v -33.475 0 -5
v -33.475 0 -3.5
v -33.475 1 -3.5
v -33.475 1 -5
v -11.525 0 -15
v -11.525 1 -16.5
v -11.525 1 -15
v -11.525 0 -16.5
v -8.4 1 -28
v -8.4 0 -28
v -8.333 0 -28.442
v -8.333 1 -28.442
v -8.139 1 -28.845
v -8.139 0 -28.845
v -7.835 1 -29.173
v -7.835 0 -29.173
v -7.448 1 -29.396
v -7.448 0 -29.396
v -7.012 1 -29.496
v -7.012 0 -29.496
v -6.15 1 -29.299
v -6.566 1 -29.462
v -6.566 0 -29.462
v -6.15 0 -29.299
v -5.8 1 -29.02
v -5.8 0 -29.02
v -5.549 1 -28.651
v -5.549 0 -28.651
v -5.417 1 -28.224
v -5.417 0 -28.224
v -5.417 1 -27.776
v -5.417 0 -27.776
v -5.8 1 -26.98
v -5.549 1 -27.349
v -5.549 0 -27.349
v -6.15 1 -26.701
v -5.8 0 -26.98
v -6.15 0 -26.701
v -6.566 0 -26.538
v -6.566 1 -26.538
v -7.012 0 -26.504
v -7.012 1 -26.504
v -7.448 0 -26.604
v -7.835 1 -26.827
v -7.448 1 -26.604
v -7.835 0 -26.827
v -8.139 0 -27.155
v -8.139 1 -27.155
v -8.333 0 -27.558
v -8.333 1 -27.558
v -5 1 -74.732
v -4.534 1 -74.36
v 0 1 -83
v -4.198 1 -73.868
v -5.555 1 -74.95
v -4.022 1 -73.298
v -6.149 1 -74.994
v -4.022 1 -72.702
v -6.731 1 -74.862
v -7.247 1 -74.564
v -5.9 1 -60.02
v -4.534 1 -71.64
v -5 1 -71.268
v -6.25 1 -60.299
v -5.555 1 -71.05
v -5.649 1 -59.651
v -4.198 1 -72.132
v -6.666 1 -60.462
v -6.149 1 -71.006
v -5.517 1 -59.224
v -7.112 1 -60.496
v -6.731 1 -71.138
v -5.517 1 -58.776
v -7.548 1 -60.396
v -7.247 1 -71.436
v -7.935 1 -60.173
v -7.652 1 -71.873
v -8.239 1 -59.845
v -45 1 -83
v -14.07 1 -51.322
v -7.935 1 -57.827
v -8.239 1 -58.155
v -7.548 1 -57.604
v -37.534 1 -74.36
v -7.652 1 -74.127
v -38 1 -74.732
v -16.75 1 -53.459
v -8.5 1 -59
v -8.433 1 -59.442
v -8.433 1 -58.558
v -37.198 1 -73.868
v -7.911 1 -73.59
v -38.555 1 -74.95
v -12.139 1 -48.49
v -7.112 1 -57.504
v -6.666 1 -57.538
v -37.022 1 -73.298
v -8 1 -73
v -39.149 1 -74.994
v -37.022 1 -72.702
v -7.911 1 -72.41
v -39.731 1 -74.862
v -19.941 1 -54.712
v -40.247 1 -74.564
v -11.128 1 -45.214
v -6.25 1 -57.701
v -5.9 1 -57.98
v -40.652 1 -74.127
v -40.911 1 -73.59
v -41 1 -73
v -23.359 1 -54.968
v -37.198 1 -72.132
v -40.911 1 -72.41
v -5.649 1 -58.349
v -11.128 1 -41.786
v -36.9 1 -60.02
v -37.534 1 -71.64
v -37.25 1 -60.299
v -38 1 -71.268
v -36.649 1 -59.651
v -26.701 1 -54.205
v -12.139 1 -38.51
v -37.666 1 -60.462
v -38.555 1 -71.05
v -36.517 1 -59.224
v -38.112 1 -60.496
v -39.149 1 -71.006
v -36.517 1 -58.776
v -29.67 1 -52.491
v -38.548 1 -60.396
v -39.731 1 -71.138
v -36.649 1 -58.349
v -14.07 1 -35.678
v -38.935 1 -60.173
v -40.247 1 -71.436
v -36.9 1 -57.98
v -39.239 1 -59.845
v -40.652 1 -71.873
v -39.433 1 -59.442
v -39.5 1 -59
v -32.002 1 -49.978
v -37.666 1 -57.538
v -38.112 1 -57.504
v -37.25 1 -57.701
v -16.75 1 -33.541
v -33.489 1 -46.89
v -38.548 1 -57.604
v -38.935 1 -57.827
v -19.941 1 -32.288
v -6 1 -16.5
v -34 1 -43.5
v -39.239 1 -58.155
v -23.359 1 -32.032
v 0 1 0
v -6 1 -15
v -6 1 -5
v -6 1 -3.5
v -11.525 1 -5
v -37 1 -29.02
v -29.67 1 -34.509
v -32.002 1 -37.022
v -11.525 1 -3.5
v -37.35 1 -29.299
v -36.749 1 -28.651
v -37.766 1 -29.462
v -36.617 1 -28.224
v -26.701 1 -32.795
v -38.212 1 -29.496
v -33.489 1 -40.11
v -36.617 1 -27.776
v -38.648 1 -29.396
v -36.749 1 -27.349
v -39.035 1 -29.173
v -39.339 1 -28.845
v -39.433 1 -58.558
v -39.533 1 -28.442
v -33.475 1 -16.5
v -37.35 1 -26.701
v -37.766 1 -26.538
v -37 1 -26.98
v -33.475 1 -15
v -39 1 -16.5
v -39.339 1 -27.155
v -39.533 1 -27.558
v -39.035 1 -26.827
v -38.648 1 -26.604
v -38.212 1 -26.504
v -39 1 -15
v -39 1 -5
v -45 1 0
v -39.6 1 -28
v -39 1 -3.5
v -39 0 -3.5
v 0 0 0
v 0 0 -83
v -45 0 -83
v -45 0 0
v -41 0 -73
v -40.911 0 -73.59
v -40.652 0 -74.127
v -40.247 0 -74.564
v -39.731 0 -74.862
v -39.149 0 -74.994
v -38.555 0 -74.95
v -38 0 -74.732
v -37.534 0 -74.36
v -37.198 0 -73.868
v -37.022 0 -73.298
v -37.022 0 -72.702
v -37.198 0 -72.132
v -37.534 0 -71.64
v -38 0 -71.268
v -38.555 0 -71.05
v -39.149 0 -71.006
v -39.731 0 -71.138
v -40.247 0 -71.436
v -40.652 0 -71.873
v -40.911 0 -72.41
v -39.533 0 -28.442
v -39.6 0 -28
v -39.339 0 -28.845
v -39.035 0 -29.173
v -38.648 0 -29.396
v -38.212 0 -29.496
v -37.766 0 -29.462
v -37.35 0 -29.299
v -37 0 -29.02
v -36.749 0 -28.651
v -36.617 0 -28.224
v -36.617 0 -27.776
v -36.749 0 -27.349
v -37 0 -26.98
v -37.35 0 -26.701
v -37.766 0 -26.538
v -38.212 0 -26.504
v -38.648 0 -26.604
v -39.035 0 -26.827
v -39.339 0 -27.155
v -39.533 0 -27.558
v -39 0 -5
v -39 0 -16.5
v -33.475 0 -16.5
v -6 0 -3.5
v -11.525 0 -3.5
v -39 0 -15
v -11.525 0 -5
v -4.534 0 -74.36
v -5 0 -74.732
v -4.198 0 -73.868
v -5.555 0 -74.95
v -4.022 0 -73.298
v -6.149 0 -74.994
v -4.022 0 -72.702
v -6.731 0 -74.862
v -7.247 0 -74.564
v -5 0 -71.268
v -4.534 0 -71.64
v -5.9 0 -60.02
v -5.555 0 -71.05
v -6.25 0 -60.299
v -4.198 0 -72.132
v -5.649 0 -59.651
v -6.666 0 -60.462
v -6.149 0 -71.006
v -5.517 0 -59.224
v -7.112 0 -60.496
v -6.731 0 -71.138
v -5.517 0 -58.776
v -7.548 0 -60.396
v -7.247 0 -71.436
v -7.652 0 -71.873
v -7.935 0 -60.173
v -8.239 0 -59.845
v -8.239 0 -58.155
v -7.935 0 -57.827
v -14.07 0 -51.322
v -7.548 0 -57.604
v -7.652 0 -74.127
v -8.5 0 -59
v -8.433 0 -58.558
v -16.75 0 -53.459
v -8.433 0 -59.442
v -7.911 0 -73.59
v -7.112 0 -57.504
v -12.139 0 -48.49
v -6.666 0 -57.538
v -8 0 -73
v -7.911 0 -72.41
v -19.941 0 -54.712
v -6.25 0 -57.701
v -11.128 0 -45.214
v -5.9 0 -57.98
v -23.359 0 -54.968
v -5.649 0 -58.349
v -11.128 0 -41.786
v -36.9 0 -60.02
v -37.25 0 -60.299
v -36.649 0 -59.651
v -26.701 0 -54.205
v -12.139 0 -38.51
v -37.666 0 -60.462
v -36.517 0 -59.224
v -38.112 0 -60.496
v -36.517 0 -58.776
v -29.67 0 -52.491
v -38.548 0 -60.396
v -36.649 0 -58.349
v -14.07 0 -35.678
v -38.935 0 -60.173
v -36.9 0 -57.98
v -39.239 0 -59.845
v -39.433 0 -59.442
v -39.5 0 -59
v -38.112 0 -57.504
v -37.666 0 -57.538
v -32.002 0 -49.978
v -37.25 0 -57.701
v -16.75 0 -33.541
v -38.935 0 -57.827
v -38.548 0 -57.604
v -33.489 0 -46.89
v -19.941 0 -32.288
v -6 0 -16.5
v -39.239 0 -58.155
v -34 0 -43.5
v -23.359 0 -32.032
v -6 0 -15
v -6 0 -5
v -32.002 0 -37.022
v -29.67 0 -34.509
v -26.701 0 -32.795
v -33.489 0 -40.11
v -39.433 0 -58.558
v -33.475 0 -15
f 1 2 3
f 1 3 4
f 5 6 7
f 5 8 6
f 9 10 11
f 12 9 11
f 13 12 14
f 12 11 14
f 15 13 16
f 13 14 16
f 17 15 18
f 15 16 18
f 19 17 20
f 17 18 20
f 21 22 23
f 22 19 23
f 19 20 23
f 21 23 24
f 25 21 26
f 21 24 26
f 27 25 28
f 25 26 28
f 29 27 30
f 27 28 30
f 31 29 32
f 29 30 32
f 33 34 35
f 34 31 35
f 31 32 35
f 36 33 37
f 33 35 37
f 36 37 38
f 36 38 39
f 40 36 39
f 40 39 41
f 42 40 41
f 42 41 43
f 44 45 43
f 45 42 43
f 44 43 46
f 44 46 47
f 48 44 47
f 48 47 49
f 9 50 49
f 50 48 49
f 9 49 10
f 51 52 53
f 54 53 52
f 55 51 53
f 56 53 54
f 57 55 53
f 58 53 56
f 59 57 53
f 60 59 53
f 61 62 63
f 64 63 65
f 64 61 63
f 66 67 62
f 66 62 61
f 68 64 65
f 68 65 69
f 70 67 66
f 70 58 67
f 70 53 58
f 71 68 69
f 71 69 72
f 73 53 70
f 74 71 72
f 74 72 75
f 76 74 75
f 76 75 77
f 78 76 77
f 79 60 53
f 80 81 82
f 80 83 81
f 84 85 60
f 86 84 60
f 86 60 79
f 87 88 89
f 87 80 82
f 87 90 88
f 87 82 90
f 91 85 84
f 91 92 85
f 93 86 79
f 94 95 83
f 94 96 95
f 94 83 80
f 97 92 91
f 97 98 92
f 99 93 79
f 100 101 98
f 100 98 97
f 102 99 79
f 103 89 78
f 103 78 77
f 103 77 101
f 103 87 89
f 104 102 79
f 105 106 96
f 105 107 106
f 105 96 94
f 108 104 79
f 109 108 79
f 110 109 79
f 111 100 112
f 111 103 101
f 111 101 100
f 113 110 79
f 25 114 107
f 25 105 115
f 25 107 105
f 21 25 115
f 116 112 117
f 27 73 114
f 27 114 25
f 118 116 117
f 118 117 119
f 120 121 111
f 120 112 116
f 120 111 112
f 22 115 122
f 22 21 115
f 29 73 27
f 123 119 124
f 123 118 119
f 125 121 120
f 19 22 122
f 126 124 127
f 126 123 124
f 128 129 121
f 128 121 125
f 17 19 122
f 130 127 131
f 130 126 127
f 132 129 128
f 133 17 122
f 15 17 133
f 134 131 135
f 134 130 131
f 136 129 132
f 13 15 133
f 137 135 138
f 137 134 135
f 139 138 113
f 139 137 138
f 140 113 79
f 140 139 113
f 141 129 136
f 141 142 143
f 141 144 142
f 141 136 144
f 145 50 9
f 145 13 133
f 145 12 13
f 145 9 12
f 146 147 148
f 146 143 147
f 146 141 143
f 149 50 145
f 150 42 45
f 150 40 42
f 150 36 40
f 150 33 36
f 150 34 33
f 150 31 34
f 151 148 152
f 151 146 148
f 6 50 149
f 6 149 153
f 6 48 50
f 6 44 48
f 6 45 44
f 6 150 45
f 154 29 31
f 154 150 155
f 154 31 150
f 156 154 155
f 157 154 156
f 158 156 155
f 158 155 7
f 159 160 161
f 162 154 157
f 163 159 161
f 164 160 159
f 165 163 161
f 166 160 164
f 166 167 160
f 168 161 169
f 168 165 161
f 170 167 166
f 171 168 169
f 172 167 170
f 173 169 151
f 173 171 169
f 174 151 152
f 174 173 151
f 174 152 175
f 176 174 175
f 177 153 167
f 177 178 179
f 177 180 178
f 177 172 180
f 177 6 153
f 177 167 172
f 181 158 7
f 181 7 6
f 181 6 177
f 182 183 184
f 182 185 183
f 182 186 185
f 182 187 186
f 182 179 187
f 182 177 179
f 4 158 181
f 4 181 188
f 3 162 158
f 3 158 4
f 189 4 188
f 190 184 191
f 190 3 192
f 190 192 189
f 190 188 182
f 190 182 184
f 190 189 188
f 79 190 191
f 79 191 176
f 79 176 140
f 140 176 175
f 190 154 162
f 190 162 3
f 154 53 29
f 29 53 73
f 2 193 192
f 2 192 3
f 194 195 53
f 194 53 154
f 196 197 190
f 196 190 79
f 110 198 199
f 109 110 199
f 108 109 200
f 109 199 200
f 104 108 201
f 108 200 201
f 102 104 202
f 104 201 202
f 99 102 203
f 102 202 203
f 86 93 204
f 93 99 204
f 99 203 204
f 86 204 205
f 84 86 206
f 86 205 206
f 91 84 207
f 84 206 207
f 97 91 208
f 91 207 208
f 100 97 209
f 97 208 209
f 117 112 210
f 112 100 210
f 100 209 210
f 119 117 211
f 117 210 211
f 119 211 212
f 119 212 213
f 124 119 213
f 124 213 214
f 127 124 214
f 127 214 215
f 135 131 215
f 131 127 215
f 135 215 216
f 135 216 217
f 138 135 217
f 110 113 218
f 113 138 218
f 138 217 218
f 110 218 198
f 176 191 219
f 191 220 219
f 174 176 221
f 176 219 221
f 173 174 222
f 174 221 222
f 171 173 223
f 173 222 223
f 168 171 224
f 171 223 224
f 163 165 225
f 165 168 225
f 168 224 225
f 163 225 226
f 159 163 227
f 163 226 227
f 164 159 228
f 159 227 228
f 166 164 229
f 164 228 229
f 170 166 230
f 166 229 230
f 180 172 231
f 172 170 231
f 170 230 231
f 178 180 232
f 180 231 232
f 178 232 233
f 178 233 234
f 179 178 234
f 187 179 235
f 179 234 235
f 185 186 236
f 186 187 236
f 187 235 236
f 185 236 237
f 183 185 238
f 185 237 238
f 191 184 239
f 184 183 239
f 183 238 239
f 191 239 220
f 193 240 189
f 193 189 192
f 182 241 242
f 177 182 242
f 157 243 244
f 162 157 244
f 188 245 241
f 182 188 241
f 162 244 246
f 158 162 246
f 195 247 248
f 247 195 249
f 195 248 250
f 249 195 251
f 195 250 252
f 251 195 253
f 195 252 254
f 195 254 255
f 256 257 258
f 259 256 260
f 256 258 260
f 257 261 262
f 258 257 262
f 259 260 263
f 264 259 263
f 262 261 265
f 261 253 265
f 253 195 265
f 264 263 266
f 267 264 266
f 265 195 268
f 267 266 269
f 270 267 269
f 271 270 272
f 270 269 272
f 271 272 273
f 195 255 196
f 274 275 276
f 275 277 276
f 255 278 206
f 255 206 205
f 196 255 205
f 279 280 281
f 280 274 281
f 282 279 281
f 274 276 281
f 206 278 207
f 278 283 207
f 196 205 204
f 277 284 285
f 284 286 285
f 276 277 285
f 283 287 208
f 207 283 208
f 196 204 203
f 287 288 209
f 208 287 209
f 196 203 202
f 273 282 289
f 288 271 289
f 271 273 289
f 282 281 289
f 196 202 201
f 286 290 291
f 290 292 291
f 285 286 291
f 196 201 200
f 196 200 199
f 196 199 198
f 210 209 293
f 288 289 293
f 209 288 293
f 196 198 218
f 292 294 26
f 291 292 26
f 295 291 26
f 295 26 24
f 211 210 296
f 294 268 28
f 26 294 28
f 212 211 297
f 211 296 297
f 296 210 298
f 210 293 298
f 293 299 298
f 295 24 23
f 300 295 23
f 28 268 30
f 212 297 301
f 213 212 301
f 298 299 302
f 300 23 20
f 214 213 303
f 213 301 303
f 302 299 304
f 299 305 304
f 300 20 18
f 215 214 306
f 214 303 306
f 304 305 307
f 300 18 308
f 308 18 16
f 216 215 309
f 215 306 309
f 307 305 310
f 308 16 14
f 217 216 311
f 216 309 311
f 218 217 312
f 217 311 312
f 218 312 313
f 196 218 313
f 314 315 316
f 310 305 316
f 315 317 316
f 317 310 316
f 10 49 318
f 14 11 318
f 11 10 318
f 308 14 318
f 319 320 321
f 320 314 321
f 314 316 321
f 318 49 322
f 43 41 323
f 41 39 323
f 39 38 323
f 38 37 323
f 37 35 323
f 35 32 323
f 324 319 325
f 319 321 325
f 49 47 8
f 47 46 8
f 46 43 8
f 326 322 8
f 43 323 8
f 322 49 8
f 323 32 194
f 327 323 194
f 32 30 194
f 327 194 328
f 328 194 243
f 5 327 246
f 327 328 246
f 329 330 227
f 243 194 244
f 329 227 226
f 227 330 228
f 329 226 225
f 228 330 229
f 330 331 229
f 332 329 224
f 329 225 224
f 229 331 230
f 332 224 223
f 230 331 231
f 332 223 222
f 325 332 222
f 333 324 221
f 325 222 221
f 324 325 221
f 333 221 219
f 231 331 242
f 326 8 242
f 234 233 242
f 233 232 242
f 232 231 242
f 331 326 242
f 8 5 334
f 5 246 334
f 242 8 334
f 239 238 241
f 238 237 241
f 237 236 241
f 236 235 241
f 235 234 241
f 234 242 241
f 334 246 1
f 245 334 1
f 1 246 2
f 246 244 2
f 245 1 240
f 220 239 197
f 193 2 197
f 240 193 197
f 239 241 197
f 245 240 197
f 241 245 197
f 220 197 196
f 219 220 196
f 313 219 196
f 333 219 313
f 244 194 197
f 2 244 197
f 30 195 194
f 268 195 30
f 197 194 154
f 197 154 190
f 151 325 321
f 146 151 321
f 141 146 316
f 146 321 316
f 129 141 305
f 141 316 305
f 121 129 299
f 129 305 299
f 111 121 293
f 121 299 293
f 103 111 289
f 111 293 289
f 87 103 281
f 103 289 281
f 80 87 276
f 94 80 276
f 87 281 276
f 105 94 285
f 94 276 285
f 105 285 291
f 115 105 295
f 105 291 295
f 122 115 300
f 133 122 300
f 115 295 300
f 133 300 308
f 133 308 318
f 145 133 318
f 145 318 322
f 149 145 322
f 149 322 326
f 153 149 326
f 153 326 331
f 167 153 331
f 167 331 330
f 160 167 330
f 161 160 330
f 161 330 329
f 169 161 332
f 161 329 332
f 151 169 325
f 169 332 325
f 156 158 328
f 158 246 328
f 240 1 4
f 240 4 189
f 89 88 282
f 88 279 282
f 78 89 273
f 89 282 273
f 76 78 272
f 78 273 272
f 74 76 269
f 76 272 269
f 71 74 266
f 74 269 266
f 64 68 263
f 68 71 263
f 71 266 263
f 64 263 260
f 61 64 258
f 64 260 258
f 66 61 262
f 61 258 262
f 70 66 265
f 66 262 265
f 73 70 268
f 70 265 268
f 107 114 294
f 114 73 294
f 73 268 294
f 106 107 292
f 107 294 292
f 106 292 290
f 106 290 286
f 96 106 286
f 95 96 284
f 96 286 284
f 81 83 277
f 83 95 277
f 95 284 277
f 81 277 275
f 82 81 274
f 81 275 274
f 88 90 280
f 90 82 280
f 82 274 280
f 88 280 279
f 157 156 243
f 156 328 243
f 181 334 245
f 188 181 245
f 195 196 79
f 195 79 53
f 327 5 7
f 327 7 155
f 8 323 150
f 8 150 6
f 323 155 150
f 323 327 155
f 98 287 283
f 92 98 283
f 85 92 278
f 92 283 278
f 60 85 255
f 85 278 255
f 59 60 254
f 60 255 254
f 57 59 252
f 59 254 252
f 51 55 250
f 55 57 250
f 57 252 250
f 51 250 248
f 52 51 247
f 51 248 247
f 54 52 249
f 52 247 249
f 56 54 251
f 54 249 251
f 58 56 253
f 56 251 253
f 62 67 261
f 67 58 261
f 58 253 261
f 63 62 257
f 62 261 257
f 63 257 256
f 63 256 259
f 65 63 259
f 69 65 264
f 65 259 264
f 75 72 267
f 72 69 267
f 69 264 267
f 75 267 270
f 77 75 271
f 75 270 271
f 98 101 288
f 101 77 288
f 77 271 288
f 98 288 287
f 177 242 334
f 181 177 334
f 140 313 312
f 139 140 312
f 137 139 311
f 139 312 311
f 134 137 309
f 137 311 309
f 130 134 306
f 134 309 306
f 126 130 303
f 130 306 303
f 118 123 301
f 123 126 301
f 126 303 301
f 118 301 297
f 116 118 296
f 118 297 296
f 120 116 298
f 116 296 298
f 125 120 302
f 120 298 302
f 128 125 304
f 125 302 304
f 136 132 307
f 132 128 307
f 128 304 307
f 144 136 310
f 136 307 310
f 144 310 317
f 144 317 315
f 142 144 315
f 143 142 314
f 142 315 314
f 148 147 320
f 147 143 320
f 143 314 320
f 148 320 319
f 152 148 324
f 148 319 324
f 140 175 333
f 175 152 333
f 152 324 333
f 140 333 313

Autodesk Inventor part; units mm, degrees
ref_plane "YZ Plane" through (0, 0, 0) normal (1, 0, 0) x (0, 1, 0)
ref_plane "XZ Plane" through (0, 0, 0) normal (0, 1, 0) x (-1, 0, 0)
ref_plane "XY Plane" through (0, 0, 0) normal (0, 0, 1) x (1, 0, 0)
sketch "Sketch1" plane through (0, 0, 0) normal (0, 1, 0) x (-1, 0, 0)
  line L0 (0, 0) -> (45, 0)
  line L1 (45, 0) -> (45, -83)
  line L2 (45, -83) -> (0, -83)
  line L3 (0, -83) -> (0, 0)
  circle A0 centre (39, -73) radius 2
  line L4 (22.5, 0) -> (22.5, -83)
  circle A1 centre (22.5, -43.5) radius 11.5
  circle A2 centre (38.1, -28) radius 1.5
  circle A3 centre (38, -59) radius 1.5
  circle A4 centre (6, -73) radius 2
  circle A5 centre (6.9, -28) radius 1.5
  circle A6 centre (7, -59) radius 1.5
  line L5 (45, -10) -> (0, -10)
  line L6 (6, -3.5) -> (11.525, -3.5)
  line L7 (11.525, -3.5) -> (11.525, -5)
  line L8 (11.525, -5) -> (6, -5)
  line L9 (6, -5) -> (6, -3.5)
  line L10 (6, -16.5) -> (11.525, -16.5)
  line L11 (11.525, -16.5) -> (11.525, -15)
  line L12 (11.525, -15) -> (6, -15)
  line L13 (6, -15) -> (6, -16.5)
  line L14 (39, -3.5) -> (33.475, -3.5)
  line L15 (33.475, -3.5) -> (33.475, -5)
  line L16 (33.475, -5) -> (39, -5)
  line L17 (39, -5) -> (39, -3.5)
  line L18 (39, -16.5) -> (33.475, -16.5)
  line L19 (33.475, -15) -> (39, -15)
  line L20 (39, -15) -> (39, -16.5)
  line L21 (33.475, -16.5) -> (33.475, -15)
  dimension "d0" = 45
  dimension "d1" = 83
  dimension "d2" = 10
  dimension "d3" = 6
  dimension "d9" = 4
  dimension "d13" = 45
  dimension "d14" = 24
  dimension "d15" = 31
  dimension "d16" = 31
  dimension "d17" = 15.5
  dimension "d18" = 23
  dimension "d19" = 3
  dimension "d20" = 3
  dimension "d22" = 20
  dimension "d23" = 6
  dimension "d24" = 10
  dimension "d25" = 1.5
extrude "Extrusion2" add sketch "Sketch1" along normal blind 1 contours L0 L4 L5 L3 | L0 L1 L5 L4 | L5 L4 A1 L2 L3 | L5 L1 L2 L4 A1
equation "\"d13\" = d0"
equation "\"d16\" = d15"
equation "\"d17\" = 0.5 * d15"
properties part number "Platte1"
